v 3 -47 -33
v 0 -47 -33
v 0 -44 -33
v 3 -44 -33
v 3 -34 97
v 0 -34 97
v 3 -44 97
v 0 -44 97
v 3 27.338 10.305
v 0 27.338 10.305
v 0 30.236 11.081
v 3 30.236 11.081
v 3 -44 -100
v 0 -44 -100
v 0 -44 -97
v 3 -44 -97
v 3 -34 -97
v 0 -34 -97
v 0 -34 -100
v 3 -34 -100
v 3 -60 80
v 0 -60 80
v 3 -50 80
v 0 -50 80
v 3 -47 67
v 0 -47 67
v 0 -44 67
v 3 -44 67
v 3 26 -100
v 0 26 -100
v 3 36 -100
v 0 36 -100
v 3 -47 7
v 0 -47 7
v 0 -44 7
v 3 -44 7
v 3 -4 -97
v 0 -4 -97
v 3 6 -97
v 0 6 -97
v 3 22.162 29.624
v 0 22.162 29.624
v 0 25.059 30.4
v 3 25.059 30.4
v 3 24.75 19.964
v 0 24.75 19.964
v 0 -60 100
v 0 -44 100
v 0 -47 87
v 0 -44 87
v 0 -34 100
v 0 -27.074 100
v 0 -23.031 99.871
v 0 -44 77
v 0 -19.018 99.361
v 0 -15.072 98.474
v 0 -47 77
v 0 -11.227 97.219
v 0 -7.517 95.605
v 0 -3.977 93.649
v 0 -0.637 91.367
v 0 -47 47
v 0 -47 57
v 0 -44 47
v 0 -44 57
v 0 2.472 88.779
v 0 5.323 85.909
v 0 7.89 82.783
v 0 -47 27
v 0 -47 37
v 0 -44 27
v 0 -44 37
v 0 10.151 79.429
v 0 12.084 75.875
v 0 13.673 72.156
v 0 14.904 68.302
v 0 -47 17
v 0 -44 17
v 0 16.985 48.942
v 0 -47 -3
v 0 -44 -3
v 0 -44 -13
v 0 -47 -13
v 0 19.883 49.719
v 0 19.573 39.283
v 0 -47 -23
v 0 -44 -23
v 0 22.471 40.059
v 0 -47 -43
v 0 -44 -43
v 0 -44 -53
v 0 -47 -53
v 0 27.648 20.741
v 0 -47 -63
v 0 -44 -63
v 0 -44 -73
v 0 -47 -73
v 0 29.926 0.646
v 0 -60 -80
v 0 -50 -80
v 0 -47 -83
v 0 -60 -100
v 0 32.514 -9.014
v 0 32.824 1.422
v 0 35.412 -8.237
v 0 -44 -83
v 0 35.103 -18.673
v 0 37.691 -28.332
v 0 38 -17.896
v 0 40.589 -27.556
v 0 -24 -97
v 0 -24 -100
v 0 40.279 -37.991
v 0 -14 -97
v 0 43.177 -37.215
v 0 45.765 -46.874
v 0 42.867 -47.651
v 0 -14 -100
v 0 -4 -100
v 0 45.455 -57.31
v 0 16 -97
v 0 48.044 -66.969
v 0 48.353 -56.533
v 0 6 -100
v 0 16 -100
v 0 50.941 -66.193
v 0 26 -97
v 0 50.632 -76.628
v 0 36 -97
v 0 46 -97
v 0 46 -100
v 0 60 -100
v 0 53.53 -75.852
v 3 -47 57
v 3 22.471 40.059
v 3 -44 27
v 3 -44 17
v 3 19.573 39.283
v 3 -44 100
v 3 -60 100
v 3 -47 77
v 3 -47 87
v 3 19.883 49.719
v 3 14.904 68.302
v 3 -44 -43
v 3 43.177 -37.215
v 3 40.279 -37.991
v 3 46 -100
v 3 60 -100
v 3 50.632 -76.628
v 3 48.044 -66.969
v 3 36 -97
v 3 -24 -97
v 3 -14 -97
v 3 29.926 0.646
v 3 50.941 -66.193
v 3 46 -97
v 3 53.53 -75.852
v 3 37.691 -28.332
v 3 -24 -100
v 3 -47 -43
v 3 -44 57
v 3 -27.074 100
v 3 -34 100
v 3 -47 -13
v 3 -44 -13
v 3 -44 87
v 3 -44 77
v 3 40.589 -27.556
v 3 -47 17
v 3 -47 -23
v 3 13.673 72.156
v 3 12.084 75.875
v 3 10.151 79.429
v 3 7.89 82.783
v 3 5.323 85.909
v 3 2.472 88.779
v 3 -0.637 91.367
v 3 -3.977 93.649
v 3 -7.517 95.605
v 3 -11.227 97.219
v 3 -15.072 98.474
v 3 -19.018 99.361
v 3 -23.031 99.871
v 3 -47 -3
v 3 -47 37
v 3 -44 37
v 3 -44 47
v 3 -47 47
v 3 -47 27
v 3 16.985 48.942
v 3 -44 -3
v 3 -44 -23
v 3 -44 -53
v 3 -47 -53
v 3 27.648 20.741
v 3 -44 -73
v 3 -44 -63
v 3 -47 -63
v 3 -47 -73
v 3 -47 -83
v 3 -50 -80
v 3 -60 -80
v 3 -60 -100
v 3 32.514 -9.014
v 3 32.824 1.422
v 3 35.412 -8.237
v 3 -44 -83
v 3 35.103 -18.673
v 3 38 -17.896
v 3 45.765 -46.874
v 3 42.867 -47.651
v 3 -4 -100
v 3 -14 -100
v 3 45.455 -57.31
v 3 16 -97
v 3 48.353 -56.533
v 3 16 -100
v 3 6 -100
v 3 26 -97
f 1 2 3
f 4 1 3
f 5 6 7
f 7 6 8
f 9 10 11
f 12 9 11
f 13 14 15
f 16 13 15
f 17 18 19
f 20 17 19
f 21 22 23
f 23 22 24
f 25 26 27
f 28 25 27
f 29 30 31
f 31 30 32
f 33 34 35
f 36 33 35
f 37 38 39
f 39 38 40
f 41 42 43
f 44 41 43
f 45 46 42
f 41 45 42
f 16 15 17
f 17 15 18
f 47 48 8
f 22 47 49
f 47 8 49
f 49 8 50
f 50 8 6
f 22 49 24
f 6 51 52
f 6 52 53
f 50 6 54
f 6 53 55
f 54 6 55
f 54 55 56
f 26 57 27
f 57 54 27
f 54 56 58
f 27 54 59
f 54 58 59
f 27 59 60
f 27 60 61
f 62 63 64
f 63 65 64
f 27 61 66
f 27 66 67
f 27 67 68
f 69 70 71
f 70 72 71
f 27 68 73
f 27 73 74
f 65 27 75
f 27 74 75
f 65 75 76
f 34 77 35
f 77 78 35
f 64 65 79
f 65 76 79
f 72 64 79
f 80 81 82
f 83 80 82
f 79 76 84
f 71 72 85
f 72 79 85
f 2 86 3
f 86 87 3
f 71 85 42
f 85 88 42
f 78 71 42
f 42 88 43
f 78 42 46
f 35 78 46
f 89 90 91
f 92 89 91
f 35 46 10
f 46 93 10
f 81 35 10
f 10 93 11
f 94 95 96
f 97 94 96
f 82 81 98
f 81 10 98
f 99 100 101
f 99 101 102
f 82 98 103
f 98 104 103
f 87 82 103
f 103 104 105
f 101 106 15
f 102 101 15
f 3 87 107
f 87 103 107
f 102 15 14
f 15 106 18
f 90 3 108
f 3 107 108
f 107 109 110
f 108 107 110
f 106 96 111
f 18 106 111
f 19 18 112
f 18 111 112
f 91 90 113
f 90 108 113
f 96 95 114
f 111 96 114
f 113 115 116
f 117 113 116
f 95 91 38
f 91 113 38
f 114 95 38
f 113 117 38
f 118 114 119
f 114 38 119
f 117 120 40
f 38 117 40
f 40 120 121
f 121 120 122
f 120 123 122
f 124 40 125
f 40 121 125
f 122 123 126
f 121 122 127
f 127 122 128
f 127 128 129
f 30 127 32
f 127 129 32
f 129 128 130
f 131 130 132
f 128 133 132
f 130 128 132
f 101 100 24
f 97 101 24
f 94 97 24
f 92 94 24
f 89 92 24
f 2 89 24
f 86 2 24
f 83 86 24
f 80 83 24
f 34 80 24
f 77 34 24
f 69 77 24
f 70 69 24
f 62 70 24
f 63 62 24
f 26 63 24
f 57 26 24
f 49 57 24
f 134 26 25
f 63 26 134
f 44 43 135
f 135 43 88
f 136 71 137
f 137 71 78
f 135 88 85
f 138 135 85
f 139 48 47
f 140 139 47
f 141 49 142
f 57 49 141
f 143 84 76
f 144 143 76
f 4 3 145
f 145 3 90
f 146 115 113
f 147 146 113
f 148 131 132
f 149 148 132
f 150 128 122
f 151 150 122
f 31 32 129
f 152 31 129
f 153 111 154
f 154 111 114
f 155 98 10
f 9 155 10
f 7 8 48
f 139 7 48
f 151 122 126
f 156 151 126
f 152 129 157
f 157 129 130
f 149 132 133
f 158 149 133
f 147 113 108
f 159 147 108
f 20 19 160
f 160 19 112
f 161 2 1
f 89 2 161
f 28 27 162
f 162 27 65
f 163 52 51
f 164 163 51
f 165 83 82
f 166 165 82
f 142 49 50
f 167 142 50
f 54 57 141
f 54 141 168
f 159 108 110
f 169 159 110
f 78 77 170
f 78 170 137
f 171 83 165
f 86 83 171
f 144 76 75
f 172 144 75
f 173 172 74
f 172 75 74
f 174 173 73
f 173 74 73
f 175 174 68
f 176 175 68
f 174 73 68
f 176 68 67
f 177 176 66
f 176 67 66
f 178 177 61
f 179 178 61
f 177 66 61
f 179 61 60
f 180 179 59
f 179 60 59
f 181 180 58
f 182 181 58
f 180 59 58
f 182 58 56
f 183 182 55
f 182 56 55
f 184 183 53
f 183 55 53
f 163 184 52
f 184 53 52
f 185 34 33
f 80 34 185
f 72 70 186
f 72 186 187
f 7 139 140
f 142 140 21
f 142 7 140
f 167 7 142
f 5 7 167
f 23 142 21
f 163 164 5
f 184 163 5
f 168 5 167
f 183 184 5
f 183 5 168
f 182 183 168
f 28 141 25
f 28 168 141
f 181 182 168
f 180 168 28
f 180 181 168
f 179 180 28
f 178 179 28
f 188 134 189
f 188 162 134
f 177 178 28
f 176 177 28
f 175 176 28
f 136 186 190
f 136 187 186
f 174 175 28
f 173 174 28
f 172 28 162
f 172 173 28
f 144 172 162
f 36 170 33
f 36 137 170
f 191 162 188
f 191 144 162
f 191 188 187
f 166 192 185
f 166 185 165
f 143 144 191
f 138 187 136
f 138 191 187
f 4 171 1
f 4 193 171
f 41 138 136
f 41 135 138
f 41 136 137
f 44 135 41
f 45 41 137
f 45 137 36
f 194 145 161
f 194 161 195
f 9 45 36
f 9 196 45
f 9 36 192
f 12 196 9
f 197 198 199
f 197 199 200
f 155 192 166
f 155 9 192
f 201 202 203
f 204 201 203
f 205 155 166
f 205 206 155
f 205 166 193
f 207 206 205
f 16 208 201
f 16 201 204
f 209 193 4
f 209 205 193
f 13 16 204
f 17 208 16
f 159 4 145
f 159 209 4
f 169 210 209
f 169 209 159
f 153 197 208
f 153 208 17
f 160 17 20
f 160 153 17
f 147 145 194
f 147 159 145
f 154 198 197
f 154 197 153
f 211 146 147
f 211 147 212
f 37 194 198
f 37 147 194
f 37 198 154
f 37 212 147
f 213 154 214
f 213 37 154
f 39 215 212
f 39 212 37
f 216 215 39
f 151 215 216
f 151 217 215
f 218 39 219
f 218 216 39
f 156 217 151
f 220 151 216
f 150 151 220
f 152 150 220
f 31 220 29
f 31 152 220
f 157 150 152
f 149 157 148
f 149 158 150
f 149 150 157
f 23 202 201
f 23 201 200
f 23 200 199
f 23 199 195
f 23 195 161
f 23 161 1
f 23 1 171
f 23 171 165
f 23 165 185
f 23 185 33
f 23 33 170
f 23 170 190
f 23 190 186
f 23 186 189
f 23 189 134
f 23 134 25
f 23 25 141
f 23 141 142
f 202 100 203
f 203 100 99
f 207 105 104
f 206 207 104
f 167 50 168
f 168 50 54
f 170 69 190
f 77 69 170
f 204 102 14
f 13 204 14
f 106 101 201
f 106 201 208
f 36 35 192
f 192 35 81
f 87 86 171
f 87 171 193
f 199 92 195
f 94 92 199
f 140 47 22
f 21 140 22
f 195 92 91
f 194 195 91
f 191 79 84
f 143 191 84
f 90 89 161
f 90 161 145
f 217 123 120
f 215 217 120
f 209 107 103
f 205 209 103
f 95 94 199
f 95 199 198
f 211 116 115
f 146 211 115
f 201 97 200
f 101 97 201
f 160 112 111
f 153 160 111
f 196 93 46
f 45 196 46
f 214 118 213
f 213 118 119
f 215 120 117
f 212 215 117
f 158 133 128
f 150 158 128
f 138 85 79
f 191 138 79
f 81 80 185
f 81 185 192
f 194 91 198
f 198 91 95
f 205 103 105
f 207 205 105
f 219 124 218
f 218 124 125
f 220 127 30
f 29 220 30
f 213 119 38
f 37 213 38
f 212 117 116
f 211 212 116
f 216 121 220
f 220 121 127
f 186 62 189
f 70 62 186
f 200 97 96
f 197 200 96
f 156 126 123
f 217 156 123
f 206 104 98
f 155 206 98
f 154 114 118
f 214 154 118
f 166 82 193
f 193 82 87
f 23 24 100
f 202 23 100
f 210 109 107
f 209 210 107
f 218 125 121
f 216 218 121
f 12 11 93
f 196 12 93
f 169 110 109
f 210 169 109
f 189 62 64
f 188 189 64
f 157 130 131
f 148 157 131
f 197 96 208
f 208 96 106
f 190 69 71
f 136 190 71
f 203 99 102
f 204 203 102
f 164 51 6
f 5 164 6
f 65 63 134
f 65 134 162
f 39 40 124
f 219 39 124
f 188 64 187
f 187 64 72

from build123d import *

# Parameters (mm, degrees)
SKETCH1_W           = 10
SKETCH1_H           = 3
BOSS_EXTRUDE1_DEPTH = 3


with BuildPart() as part:
    # Sketch1 → Boss-Extrude1 (new body)
    with BuildSketch(Plane(origin=(0, 0, 0), x_dir=(0, 0, -1), z_dir=(1, 0, 0))):
        with BuildLine():
            Line((-100, -44), (-100, -60))
            Line((-100, -60), (-80, -60))
            Line((-80, -60), (-80, -50))
            Line((-80, -50), (80, -50))
            Line((80, -50), (80, -60))
            Line((80, -60), (100, -60))
            Line((100, -60), (100, -44))
            Line((100, -44), (97, -44))
            Line((97, -44), (97, -34))
            Line((97, -34), (100, -34))
            Line((100, -34), (100, -24))
            Line((100, -24), (97, -24))
            Line((97, -24), (97, -14))
            Line((97, -14), (100, -14))
            Line((100, -14), (100, -4))
            Line((100, -4), (97, -4))
            Line((97, -4), (97, 6))
            Line((97, 6), (100, 6))
            Line((100, 6), (100, 16))
            Line((100, 16), (97, 16))
            Line((97, 16), (97, 26))
            Line((97, 26), (100, 26))
            Line((100, 26), (100, 36))
            Line((100, 36), (97, 36))
            Line((97, 36), (97, 46))
            Line((97, 46), (100, 46))
            Line((100, 46), (100, 60))
            Line((100, 60), (75.851854343, 53.529523872))
            Line((75.851854343, 53.529523872), (76.628311478, 50.631746394))
            Line((76.628311478, 50.631746394), (66.969053215, 48.043555943))
            Line((66.969053215, 48.043555943), (66.19259608, 50.941333421))
            Line((66.19259608, 50.941333421), (56.533337817, 48.35314297))
            Line((56.533337817, 48.35314297), (57.309794952, 45.455365492))
            Line((57.309794952, 45.455365492), (47.650536689, 42.86717504))
            Line((47.650536689, 42.86717504), (46.874079554, 45.764952519))
            Line((46.874079554, 45.764952519), (37.214821291, 43.176762068))
            Line((37.214821291, 43.176762068), (37.991278427, 40.278984589))
            Line((37.991278427, 40.278984589), (28.332020164, 37.690794138))
            Line((28.332020164, 37.690794138), (27.555563028, 40.588571617))
            Line((27.555563028, 40.588571617), (17.896304765, 38.000381166))
            Line((17.896304765, 38.000381166), (18.672761901, 35.102603687))
            Line((18.672761901, 35.102603687), (9.013503638, 32.514413236))
            Line((9.013503638, 32.514413236), (8.237046503, 35.412190715))
            Line((8.237046503, 35.412190715), (-1.42221176, 32.824000264))
            Line((-1.42221176, 32.824000264), (-0.645754625, 29.926222785))
            Line((-0.645754625, 29.926222785), (-10.305012888, 27.338032334))
            Line((-10.305012888, 27.338032334), (-11.081470023, 30.235809813))
            Line((-11.081470023, 30.235809813), (-20.740728286, 27.647619362))
            Line((-20.740728286, 27.647619362), (-19.964271151, 24.749841883))
            Line((-19.964271151, 24.749841883), (-29.623529414, 22.161651432))
            Line((-29.623529414, 22.161651432), (-30.399986549, 25.059428911))
            Line((-30.399986549, 25.059428911), (-40.059244812, 22.47123846))
            Line((-40.059244812, 22.47123846), (-39.282787677, 19.573460981))
            Line((-39.282787677, 19.573460981), (-48.942045939, 16.98527053))
            Line((-48.942045939, 16.98527053), (-49.718503075, 19.883048009))
            Line((-49.718503075, 19.883048009), (-68.302221487, 14.903555668))
            ThreePointArc((-68.302221487, 14.903555668), (-91.366544651, -0.636913735), (-100, -27.074247963))
            Line((-100, -27.074247963), (-100, -34))
            Line((-100, -34), (-97, -34))
            Line((-97, -34), (-97, -44))
            Line((-97, -44), (-100, -44))
        make_face()
        with Locations((-82, -45.5)):
            Rectangle(SKETCH1_W, SKETCH1_H, mode=Mode.SUBTRACT)
        with Locations((-62, -45.5)):
            Rectangle(SKETCH1_W, SKETCH1_H, mode=Mode.SUBTRACT)
        with Locations((-42, -45.5)):
            Rectangle(SKETCH1_W, SKETCH1_H, mode=Mode.SUBTRACT)
        with Locations((-22, -45.5)):
            Rectangle(SKETCH1_W, SKETCH1_H, mode=Mode.SUBTRACT)
        with Locations((-2, -45.5)):
            Rectangle(SKETCH1_W, SKETCH1_H, mode=Mode.SUBTRACT)
        with Locations((18, -45.5)):
            Rectangle(SKETCH1_W, SKETCH1_H, mode=Mode.SUBTRACT)
        with Locations((38, -45.5)):
            Rectangle(SKETCH1_W, SKETCH1_H, mode=Mode.SUBTRACT)
        with Locations((58, -45.5)):
            Rectangle(SKETCH1_W, SKETCH1_H, mode=Mode.SUBTRACT)
        with Locations((78, -45.5)):
            Rectangle(SKETCH1_W, SKETCH1_H, mode=Mode.SUBTRACT)
    extrude(amount=BOSS_EXTRUDE1_DEPTH)


solid = part.part
